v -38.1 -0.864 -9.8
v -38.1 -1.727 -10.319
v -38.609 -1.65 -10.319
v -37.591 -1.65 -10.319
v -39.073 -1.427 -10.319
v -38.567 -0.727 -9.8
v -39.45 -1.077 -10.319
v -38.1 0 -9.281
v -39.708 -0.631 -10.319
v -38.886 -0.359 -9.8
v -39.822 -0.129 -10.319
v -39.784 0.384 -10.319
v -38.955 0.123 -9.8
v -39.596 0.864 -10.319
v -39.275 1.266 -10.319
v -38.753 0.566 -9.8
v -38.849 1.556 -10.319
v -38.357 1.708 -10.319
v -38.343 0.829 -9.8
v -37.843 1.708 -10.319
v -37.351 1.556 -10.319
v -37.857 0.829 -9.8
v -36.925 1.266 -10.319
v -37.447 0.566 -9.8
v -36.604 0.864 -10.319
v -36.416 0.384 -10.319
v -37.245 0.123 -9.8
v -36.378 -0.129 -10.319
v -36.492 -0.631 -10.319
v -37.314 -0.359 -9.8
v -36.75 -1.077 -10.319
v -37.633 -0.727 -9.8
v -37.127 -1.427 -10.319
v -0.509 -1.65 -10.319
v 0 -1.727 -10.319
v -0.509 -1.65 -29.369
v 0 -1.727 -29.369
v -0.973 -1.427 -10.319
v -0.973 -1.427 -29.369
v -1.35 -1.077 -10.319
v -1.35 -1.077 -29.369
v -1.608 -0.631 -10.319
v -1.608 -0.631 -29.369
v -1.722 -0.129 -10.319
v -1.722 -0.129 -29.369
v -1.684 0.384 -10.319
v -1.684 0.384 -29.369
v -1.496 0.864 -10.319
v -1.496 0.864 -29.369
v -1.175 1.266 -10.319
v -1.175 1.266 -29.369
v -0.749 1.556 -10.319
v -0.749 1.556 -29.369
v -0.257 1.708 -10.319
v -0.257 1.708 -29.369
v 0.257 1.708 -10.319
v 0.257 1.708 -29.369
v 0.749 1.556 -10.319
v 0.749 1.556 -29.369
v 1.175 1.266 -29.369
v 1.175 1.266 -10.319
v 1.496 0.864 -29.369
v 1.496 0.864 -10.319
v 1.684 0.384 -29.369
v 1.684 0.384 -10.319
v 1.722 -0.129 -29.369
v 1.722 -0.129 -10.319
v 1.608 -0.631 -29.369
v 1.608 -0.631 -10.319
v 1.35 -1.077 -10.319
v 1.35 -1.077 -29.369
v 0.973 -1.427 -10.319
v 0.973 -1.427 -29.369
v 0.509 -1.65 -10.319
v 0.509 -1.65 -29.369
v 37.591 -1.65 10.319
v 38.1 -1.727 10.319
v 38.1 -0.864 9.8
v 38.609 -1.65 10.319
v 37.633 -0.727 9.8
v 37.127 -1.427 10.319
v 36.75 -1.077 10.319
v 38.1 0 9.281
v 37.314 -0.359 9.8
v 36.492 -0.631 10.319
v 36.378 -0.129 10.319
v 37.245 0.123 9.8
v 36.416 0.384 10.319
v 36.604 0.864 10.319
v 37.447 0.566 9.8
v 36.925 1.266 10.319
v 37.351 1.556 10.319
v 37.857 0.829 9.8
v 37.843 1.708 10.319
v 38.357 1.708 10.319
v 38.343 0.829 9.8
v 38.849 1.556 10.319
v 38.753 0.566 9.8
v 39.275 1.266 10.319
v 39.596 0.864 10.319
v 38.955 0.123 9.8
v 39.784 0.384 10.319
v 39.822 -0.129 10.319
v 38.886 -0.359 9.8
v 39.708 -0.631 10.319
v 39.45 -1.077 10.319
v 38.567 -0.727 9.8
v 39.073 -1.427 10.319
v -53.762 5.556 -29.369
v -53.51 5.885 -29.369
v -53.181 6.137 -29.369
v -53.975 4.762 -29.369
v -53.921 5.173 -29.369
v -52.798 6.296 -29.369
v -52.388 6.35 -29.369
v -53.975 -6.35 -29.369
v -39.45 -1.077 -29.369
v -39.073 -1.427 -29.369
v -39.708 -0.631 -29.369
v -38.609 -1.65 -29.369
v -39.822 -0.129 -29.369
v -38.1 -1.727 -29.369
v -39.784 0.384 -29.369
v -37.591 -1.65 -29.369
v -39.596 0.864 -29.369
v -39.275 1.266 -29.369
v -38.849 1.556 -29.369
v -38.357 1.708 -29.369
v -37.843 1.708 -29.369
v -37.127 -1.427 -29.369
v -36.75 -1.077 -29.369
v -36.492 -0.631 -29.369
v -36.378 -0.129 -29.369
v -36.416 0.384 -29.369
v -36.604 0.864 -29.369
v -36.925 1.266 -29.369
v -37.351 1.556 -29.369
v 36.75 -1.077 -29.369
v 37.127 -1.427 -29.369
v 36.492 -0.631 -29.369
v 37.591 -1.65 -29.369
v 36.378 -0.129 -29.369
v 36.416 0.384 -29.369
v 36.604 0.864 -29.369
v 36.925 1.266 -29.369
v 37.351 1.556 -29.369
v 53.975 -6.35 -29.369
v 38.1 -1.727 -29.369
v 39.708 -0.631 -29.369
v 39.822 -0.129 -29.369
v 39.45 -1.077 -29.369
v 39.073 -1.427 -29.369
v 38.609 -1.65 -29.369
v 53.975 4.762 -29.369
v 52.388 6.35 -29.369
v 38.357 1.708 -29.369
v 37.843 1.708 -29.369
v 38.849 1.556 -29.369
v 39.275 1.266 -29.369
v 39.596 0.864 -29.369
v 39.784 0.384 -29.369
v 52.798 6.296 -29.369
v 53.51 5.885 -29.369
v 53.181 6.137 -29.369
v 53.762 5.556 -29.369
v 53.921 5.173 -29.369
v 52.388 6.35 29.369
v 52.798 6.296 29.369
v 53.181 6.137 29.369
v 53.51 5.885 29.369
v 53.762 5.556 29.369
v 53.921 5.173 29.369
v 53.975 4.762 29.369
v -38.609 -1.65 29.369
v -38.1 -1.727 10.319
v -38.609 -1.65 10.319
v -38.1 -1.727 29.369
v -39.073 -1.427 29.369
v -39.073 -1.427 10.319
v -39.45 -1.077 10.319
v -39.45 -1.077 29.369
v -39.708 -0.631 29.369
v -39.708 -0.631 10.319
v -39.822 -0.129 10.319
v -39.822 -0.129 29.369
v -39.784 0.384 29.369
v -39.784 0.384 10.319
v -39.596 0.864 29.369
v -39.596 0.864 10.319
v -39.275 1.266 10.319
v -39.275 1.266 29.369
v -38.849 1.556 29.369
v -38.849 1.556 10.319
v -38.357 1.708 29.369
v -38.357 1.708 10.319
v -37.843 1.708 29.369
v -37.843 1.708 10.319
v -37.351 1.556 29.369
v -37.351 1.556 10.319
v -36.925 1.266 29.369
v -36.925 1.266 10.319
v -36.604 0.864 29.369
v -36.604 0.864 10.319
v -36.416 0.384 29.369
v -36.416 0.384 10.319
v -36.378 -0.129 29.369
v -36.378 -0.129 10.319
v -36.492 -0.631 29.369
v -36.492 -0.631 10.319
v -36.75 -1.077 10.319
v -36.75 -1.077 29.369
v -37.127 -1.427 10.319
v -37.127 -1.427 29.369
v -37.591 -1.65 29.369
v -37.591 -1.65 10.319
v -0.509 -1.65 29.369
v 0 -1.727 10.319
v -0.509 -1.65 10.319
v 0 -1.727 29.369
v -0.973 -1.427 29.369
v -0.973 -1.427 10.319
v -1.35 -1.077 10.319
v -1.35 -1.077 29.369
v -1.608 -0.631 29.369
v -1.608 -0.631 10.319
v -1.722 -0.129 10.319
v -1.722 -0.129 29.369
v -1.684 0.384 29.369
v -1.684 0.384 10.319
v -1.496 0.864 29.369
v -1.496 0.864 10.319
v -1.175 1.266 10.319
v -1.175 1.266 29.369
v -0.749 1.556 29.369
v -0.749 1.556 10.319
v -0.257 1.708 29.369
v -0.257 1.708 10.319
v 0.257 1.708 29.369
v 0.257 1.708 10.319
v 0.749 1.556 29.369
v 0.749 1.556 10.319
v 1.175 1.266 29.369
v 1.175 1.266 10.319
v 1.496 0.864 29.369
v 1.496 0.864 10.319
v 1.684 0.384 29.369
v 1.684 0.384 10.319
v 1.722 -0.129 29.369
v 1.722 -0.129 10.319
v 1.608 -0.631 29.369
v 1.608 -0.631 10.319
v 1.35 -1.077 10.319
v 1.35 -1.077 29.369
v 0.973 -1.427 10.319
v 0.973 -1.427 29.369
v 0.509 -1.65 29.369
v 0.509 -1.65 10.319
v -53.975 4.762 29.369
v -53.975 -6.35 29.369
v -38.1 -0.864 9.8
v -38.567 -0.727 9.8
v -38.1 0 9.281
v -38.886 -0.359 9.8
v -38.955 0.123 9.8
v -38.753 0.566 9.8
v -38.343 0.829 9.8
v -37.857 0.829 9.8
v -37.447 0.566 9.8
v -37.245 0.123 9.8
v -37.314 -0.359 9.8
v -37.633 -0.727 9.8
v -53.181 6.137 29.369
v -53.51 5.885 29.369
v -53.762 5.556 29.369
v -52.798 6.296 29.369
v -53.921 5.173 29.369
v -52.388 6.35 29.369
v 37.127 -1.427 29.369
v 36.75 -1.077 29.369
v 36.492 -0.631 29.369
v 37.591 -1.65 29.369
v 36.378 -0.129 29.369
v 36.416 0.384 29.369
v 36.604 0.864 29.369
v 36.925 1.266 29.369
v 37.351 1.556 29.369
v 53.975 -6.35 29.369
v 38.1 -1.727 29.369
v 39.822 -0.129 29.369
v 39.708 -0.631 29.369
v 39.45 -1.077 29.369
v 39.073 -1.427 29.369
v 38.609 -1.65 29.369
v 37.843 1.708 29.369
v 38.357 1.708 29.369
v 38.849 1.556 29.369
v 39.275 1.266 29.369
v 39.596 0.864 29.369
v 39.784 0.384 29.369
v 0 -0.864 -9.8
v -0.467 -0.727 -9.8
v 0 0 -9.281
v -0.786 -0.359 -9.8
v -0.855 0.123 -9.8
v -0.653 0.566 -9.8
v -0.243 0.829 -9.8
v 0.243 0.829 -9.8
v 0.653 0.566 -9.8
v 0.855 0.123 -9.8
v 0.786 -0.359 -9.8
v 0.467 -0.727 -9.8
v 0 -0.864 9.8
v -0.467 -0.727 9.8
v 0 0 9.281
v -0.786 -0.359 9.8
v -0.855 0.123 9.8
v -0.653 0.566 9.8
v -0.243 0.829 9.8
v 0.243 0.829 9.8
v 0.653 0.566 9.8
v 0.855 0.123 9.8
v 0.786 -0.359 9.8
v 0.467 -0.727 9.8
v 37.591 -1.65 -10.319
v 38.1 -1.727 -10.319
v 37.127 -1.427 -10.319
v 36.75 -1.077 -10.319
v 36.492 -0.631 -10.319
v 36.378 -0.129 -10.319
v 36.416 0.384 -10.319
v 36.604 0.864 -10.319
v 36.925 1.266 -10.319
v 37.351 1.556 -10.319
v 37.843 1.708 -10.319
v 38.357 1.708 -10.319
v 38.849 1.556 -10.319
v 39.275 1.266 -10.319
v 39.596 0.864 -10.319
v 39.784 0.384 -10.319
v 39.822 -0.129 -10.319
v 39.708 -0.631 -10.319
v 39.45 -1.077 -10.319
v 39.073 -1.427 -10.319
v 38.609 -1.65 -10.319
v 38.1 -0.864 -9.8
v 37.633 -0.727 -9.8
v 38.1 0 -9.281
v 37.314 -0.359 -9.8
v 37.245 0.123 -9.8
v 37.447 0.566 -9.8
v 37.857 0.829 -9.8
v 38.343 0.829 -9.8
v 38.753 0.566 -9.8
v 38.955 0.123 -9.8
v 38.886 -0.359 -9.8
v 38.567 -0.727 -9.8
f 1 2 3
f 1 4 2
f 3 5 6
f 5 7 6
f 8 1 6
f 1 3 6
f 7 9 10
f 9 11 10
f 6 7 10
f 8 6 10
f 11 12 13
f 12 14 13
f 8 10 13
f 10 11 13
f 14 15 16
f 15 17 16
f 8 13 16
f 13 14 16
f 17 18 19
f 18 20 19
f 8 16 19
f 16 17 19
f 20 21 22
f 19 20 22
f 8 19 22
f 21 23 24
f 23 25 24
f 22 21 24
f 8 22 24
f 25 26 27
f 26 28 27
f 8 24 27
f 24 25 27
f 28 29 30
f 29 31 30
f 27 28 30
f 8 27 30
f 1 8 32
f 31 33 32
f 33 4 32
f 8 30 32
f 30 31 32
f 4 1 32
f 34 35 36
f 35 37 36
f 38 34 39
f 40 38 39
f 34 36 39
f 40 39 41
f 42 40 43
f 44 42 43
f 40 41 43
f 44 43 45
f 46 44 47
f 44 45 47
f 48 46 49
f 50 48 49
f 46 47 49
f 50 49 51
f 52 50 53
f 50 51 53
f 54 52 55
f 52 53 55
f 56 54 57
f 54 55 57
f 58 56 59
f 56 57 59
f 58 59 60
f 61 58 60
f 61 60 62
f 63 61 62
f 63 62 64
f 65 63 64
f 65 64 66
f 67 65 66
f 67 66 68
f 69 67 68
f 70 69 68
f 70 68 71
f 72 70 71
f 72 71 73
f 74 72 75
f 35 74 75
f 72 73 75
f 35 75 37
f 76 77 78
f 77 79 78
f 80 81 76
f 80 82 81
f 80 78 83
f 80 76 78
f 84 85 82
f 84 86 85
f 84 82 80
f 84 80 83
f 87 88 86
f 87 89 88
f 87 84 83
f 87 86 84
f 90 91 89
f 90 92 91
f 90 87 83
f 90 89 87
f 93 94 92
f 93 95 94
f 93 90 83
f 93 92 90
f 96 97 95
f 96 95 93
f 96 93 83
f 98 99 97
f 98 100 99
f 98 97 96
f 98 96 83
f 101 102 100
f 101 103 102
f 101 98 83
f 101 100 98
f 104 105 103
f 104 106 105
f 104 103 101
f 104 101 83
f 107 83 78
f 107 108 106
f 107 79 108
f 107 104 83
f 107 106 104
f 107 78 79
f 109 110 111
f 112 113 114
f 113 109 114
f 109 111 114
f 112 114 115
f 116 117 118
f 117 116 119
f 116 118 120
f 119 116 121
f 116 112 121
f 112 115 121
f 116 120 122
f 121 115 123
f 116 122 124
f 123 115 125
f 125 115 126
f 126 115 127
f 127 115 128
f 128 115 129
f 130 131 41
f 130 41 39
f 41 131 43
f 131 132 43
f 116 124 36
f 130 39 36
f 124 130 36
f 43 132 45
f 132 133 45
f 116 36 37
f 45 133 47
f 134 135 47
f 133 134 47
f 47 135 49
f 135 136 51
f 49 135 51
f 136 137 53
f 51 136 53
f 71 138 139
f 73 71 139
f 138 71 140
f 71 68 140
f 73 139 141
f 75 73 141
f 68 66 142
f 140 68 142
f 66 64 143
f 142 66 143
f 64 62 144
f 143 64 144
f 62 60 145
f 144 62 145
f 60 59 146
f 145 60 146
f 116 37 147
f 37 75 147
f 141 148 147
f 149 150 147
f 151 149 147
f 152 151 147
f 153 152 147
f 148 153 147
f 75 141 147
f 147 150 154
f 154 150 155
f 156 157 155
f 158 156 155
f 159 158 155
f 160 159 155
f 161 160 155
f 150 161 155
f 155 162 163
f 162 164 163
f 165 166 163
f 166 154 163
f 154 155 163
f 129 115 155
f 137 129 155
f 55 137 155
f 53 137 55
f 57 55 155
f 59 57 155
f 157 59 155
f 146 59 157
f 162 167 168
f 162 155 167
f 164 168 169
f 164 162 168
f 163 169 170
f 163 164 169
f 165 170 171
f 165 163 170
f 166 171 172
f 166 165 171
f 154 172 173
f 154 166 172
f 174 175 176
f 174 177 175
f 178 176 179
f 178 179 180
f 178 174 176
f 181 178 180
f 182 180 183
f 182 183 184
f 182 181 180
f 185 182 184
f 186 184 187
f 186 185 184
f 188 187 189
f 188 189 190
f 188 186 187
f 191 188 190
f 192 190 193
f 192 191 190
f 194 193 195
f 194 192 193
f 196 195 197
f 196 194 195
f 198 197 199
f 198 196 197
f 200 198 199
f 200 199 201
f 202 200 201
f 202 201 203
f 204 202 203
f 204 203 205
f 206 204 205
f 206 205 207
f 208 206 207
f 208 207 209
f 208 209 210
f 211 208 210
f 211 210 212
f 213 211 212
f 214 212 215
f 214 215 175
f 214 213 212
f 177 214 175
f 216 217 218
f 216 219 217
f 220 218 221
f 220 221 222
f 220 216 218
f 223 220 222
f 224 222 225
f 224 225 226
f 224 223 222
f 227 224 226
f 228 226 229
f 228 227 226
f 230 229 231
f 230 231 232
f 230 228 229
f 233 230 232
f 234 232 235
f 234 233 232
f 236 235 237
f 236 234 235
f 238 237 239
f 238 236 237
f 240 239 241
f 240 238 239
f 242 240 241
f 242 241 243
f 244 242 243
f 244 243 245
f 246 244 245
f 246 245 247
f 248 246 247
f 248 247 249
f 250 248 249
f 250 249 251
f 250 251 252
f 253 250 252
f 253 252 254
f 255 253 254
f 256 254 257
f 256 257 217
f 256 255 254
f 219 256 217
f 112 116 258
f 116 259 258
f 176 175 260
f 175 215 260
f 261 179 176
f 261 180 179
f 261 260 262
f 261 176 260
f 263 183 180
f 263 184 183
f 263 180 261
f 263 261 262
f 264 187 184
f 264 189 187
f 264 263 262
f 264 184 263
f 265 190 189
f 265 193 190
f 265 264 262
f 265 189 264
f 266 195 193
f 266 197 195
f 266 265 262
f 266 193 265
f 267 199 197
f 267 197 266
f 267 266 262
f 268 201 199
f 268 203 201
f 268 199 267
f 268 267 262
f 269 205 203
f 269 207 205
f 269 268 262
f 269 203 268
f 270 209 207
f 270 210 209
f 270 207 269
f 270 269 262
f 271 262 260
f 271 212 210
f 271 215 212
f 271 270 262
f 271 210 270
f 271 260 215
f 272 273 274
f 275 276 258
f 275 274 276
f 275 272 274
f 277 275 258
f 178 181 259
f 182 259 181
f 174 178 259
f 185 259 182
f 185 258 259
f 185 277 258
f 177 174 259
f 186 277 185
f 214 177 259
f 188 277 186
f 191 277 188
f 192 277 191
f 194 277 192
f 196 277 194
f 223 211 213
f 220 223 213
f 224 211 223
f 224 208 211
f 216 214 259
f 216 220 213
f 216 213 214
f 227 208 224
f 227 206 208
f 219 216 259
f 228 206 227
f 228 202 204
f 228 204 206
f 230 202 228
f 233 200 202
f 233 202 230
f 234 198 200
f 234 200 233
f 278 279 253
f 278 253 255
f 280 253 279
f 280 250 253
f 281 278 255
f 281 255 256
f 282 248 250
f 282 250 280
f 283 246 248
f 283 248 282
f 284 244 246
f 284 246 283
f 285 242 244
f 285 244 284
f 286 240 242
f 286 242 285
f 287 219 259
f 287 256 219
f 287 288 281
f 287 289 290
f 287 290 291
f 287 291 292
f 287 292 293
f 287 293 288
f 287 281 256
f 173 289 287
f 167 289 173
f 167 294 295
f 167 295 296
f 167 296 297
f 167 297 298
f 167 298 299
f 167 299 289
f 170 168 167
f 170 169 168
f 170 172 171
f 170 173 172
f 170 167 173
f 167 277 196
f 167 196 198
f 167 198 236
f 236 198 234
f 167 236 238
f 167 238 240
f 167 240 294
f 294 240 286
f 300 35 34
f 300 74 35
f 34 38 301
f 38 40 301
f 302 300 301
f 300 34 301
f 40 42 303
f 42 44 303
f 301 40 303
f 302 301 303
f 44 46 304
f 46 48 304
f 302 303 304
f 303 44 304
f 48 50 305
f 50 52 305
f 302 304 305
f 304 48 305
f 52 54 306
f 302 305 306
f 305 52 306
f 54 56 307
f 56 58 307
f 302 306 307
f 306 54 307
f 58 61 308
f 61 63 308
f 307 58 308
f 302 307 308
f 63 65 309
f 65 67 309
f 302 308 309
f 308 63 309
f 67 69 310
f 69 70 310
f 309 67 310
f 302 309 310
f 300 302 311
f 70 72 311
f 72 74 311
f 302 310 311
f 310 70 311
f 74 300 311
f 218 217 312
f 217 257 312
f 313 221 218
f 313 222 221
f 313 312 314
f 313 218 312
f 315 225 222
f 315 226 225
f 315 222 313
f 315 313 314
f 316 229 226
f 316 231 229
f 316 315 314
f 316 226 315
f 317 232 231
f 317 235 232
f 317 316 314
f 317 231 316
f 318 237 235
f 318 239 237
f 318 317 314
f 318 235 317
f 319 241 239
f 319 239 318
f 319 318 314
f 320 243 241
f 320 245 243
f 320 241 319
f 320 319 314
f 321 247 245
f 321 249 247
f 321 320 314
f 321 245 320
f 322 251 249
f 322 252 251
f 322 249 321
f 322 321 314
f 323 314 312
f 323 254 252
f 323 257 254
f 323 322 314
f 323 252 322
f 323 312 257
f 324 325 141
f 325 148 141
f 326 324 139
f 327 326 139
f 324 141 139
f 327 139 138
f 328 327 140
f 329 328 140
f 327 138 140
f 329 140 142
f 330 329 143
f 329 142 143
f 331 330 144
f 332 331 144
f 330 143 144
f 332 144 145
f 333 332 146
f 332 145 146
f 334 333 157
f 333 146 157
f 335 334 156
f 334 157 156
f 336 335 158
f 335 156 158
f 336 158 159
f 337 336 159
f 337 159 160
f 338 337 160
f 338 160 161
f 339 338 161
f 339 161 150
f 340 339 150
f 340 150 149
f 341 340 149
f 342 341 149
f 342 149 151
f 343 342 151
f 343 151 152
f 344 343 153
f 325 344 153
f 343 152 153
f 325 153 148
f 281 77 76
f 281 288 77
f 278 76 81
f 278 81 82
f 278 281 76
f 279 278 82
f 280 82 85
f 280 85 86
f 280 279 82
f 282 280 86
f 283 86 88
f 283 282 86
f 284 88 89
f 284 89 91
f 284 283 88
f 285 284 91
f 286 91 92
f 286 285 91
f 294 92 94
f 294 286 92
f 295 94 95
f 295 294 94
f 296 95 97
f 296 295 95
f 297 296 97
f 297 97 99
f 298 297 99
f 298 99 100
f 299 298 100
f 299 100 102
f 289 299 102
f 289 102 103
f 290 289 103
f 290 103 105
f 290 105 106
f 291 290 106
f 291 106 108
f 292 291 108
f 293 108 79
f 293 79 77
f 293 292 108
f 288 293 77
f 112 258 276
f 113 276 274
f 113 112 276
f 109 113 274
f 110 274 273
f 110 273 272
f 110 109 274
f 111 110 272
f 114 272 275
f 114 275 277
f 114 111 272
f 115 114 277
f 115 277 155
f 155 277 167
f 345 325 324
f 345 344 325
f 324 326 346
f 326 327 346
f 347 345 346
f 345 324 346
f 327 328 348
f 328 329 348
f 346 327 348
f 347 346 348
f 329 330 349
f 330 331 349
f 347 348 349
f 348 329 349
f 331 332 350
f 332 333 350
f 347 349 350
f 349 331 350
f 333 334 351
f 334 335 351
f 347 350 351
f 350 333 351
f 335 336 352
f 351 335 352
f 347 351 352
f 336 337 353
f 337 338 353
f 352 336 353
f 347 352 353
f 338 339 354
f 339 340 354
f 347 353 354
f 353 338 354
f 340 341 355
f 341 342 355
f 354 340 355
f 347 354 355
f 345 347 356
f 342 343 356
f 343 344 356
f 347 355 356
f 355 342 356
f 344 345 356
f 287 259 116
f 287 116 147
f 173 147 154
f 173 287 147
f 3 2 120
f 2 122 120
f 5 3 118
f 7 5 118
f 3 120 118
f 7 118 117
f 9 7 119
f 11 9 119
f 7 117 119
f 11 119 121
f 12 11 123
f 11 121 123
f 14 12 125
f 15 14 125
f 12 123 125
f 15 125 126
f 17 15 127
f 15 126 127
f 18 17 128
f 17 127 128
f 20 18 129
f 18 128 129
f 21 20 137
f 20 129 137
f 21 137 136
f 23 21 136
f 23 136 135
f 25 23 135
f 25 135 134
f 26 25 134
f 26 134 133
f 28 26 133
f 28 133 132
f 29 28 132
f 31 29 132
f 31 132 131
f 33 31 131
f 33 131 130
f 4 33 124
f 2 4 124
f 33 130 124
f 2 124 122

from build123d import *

# Parameters (mm, degrees)
SKETCH1_W                          = 107.95
SKETCH1_H                          = 12.7
BOSS_EXTRUDE1_DEPTH                = 29.36875
TAP_DRILL_FOR_8_32_TAP1_AT_2_COUNT = 2
TAP_DRILL_FOR_8_32_TAP1_AT_2_PITCH = 76.2
TAP_DRILL_FOR_8_32_TAP1_AT_3_COUNT = 2
TAP_DRILL_FOR_8_32_TAP1_AT_3_PITCH = 38.1
FILLET1_R                          = 1.5875


with BuildPart() as part:
    # Sketch1 → Boss-Extrude1 (new, symmetric)
    with BuildSketch(Plane.XY):
        Rectangle(SKETCH1_W, SKETCH1_H)
    extrude(amount=BOSS_EXTRUDE1_DEPTH, both=True)

    # Sketch4 → Tap Drill for #8-32 Tap1 (revolve, cut)
    with BuildSketch(Plane(origin=(-38.1, 0, 29.36875), x_dir=(0, -1, 0), z_dir=(1, 0, 0))):
        Polygon((0, 0), (0, 20.087806461), (1.7272, 19.05), (1.7272, 0), align=None)
    tap_drill_for_8_32_tap1 = revolve(axis=Axis((-38.1, 0, 35.71875), (0, 0, -1)), mode=Mode.SUBTRACT)

    # Tap Drill for #8-32 Tap1 at 2: Tap Drill for #8-32 Tap1 ×2
    with Locations(*[(i * TAP_DRILL_FOR_8_32_TAP1_AT_2_PITCH, 0, 0) for i in range(1, TAP_DRILL_FOR_8_32_TAP1_AT_2_COUNT)]):
        add(tap_drill_for_8_32_tap1, mode=Mode.SUBTRACT)

    # Tap Drill for #8-32 Tap1 at 3: Tap Drill for #8-32 Tap1 ×2
    with Locations(*[(i * TAP_DRILL_FOR_8_32_TAP1_AT_3_PITCH, 0, 0) for i in range(1, TAP_DRILL_FOR_8_32_TAP1_AT_3_COUNT)]):
        add(tap_drill_for_8_32_tap1, mode=Mode.SUBTRACT)

    # Mirror1: Tap Drill for #8-32 Tap1 across plane
    add(tap_drill_for_8_32_tap1.mirror(Plane.XY), mode=Mode.SUBTRACT)

    # Mirror1 copy 1 sketch → Mirror1 copy 1 (revolve, cut)
    with BuildSketch(Plane(origin=(38.1, 0, -29.36875), x_dir=(0, -1, 0), z_dir=(1, 0, 0))):
        Polygon((0, 0), (0, -20.087806461), (1.7272, -19.05), (1.7272, 0), align=None)
    revolve(axis=Axis((38.1, 0, -35.71875), (0, 0, -1)), mode=Mode.SUBTRACT)

    # Mirror1 copy 2 sketch → Mirror1 copy 2 (revolve, cut)
    with BuildSketch(Plane(origin=(0, 0, -29.36875), x_dir=(0, -1, 0), z_dir=(1, 0, 0))):
        Polygon((0, 0), (0, -20.087806461), (1.7272, -19.05), (1.7272, 0), align=None)
    revolve(axis=Axis((0, 0, -35.71875), (0, 0, -1)), mode=Mode.SUBTRACT)

    # Fillet1
    fillet1_edges = [part.edges().sort_by_distance(p)[0] for p in [
        (-53.975, 6.35, 0),
        (53.975, 6.35, 0),
    ]]
    fillet(fillet1_edges, radius=FILLET1_R)


solid = part.part
